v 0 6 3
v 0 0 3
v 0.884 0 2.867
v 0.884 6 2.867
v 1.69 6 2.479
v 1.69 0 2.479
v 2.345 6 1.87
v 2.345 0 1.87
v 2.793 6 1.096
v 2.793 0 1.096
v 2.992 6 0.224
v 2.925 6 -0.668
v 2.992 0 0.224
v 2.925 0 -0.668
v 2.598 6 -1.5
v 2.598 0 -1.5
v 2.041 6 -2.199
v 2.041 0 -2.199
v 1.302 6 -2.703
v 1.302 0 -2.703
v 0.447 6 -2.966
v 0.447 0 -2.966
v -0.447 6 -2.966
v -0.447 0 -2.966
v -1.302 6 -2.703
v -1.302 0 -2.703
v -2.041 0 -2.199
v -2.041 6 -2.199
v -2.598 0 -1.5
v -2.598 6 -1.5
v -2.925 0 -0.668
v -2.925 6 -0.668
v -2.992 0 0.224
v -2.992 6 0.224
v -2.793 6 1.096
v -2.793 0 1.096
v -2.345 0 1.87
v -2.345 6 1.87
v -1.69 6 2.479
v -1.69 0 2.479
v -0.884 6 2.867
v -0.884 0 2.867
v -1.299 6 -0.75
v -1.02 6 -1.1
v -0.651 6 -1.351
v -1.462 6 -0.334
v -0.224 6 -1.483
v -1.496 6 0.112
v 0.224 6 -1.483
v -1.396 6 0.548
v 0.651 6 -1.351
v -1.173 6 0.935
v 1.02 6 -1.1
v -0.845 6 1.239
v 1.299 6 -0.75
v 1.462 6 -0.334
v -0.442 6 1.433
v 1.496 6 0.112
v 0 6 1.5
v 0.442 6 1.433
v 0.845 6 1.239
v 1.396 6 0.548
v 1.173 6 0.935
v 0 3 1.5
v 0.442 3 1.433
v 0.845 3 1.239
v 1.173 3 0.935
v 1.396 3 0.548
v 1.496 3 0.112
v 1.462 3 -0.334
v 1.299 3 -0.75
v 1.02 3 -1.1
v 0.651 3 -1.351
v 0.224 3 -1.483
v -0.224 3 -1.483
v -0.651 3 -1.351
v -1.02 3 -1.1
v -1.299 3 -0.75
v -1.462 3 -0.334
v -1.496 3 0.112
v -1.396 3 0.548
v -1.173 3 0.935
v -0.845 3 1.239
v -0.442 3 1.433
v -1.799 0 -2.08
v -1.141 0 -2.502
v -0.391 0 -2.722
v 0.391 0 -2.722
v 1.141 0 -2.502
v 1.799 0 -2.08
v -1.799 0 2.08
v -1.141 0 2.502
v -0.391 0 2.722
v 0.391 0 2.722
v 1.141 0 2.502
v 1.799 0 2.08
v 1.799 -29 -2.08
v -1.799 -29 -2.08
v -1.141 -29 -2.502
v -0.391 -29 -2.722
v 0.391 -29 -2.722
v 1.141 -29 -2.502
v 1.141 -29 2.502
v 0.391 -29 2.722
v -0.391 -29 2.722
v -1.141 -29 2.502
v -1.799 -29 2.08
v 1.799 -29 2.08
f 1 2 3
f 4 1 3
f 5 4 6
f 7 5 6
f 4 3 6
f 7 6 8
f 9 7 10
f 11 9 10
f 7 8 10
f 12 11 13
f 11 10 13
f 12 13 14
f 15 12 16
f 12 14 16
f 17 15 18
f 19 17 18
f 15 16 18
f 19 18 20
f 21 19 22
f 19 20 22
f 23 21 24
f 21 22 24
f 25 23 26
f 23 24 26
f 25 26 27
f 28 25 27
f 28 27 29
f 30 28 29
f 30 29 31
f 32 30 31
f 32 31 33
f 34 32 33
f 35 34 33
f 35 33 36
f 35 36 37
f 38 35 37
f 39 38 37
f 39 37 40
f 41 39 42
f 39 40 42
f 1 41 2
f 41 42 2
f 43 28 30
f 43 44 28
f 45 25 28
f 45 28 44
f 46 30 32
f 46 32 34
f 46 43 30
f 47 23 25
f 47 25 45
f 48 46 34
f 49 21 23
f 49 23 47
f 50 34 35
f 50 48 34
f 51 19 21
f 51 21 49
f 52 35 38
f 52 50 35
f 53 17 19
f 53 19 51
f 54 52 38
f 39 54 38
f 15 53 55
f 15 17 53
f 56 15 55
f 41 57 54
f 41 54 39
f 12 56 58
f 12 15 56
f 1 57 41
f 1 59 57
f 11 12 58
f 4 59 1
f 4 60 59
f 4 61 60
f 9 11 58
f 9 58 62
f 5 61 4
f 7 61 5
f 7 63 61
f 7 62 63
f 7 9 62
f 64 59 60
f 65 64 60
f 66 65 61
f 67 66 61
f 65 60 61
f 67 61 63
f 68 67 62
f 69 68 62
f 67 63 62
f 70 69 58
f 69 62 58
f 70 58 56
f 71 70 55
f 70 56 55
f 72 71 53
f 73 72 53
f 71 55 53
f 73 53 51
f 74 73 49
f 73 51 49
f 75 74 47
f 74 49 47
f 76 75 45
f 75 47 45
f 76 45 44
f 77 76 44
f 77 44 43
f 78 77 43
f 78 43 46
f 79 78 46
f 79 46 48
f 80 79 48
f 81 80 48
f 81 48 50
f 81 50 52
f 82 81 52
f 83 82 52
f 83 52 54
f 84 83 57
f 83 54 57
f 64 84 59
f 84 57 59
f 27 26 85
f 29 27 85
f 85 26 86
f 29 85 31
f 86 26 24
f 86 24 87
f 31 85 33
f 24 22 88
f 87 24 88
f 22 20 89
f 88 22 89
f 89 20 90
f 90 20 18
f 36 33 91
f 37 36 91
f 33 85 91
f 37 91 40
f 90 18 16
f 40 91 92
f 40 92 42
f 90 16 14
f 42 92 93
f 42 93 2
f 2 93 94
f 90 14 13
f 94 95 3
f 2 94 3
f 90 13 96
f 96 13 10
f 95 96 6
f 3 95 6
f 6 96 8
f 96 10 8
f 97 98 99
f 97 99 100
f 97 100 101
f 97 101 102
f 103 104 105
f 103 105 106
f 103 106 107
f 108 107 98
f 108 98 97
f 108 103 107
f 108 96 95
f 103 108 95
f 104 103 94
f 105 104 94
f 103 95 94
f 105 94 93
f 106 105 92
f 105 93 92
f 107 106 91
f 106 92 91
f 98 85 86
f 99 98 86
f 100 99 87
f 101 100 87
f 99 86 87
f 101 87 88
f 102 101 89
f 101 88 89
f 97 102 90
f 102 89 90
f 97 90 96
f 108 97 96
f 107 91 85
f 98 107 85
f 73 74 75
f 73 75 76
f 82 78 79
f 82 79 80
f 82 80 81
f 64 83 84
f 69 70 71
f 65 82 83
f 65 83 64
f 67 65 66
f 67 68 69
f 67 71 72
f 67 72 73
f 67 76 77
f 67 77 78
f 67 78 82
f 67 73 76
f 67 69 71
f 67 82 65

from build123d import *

# Parameters (mm, degrees)
IZIM2_R                     = 3
Y_KSEKLIK_EKSTR_ZYON1_DEPTH = 6
IZIM3_R                     = 1.5
KES_EKSTR_ZYON1_DEPTH       = 3
Y_KSEKLIK_EKSTR_ZYON2_DEPTH = 29


with BuildPart() as part:
    # Çizim2 → Yükseklik-Ekstrüzyon1 (new body)
    with BuildSketch(Plane(origin=(0, 0, 0), x_dir=(1, 0, 0), z_dir=(0, 1, 0))):
        with Locations(Location((0, 0, 0), (0, 0, 270))):
            Circle(IZIM2_R)
    extrude(amount=Y_KSEKLIK_EKSTR_ZYON1_DEPTH)

    # Çizim3 → Kes-Ekstrüzyon1 (cut)
    with BuildSketch(Plane(origin=(0, 6, 0), x_dir=(1, 0, 0), z_dir=(0, 1, 0))):
        with Locations(Location((0, 0, 0), (0, 0, 270))):
            Circle(IZIM3_R)
    extrude(amount=-KES_EKSTR_ZYON1_DEPTH, mode=Mode.SUBTRACT)

    # Çizim4 → Yükseklik-Ekstrüzyon2 (add)
    with BuildSketch(Plane.XZ):
        with BuildLine():
            ThreePointArc((1.79891634, 2.08), (0, 2.75), (-1.79891634, 2.08))
            Line((-1.79891634, 2.08), (-1.79891634, -2.08))
            ThreePointArc((-1.79891634, -2.08), (0, -2.75), (1.79891634, -2.08))
            Line((1.79891634, -2.08), (1.79891634, 2.08))
        make_face()
    extrude(amount=Y_KSEKLIK_EKSTR_ZYON2_DEPTH)


solid = part.part
